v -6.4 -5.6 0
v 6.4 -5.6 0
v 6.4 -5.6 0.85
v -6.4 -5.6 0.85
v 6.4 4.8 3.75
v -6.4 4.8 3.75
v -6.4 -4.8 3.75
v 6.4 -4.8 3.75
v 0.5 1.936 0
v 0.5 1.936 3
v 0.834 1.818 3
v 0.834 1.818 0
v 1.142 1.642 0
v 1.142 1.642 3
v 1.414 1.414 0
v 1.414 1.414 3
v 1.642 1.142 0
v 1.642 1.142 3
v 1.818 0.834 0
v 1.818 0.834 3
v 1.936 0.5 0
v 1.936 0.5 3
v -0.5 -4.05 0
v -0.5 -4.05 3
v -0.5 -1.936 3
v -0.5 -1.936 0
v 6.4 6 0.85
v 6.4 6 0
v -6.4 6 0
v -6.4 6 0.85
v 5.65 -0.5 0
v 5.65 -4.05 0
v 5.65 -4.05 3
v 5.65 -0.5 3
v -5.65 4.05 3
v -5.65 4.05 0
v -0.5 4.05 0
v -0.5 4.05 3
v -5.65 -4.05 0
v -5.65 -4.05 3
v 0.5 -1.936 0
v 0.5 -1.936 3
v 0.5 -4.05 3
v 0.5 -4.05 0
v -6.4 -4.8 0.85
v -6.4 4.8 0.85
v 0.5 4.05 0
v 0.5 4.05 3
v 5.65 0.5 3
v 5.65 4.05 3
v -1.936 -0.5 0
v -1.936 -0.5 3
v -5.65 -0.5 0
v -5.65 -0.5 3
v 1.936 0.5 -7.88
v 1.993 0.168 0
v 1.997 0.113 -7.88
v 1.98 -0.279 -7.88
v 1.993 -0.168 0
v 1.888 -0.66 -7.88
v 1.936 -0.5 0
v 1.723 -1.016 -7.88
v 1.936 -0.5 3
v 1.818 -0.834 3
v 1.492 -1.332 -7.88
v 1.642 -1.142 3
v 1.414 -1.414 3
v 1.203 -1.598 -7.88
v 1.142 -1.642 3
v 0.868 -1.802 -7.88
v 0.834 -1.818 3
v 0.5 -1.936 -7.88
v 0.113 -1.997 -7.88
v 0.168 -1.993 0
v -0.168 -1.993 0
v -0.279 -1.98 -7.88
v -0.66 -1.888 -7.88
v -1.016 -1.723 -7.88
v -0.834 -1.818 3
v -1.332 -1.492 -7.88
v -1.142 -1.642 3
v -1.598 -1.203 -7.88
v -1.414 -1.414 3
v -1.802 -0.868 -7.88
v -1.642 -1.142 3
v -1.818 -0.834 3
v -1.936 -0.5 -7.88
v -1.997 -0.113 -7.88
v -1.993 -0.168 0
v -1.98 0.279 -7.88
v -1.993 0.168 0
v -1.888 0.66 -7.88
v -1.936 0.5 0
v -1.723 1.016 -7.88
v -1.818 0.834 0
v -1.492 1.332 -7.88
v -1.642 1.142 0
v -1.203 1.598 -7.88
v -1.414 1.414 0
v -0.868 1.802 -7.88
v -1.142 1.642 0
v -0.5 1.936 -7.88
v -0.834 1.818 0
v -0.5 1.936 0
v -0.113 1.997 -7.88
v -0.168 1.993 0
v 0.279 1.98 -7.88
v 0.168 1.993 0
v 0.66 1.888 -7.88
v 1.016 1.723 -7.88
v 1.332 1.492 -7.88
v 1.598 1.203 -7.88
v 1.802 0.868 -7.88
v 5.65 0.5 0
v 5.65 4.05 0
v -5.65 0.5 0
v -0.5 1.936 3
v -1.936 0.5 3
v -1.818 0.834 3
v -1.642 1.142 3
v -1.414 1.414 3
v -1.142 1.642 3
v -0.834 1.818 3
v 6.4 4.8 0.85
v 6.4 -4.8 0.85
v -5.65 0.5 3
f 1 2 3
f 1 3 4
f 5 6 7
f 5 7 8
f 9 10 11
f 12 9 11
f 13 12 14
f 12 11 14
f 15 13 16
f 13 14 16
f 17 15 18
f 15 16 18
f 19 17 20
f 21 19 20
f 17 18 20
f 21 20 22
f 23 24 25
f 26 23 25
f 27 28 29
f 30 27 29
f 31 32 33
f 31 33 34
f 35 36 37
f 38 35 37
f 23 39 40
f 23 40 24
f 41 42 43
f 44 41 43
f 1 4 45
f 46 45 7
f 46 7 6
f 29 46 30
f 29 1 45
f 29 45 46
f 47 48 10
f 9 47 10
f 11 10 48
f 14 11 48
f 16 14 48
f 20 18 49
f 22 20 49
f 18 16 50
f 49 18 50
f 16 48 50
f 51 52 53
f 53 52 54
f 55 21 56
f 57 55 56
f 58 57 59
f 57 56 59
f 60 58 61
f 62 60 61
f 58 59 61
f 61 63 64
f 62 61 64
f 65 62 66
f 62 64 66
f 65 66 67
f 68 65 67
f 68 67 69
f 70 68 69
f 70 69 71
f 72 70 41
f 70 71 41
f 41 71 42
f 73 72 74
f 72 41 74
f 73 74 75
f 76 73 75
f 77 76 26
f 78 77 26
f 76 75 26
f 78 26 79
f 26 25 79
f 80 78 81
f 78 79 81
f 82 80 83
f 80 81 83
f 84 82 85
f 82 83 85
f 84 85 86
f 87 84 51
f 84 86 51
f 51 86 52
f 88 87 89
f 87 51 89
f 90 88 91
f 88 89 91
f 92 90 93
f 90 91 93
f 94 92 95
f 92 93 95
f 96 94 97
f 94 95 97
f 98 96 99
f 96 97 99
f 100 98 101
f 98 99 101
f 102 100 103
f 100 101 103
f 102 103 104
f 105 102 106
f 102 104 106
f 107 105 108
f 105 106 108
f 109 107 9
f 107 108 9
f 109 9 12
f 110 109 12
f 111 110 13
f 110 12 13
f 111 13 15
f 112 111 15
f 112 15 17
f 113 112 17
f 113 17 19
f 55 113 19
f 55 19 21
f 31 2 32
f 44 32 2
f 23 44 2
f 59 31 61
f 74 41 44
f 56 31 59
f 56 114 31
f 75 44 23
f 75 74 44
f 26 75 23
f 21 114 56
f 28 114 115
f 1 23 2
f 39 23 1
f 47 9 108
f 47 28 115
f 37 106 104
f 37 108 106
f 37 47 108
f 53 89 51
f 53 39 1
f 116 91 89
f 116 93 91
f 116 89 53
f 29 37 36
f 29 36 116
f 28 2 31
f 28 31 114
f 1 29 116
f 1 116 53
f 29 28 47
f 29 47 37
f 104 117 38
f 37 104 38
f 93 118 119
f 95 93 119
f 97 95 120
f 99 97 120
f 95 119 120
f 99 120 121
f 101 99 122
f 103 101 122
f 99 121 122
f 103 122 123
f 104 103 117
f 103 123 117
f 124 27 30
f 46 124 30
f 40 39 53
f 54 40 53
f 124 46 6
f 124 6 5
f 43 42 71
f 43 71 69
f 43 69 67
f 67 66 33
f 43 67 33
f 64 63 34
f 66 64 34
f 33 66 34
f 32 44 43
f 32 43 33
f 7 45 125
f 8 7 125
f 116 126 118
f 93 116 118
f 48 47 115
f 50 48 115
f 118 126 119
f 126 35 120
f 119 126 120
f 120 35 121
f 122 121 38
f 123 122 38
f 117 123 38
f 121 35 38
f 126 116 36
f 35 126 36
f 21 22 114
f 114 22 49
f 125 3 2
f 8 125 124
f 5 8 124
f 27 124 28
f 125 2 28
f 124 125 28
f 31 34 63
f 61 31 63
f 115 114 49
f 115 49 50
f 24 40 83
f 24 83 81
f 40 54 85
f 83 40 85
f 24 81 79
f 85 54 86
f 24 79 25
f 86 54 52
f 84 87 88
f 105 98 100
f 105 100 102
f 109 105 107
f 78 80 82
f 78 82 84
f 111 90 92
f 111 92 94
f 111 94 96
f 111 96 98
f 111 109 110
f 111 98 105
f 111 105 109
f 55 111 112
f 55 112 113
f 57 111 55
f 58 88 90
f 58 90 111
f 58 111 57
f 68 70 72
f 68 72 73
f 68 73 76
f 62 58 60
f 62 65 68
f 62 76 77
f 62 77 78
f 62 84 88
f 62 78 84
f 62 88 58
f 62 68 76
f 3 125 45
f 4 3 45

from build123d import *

# Parameters (mm, degrees)
SCHIZZO1_W                   = 12.8
SCHIZZO1_H                   = 9.6
SCHIZZO1_W_2                 = 11.3
SCHIZZO1_H_2                 = 8.1
ESTRUSIONE_ESTRUSIONE1_DEPTH = 3
SCHIZZO2_W                   = 12.8
SCHIZZO2_H                   = 9.6
ESTRUSIONE_ESTRUSIONE2_DEPTH = 0.75
SCHIZZO3_W                   = 12.8
SCHIZZO3_H                   = 1.2
SCHIZZO3_H_2                 = 0.8
ESTRUSIONE_ESTRUSIONE3_DEPTH = 0.85
ESTRUSIONE_ESTRUSIONE4_DEPTH = 3
SCHIZZO5_R                   = 2
ESTRUSIONE_ESTRUSIONE5_DEPTH = 7.88


with BuildPart() as part:
    # Schizzo1 → Estrusione-Estrusione1 (new body)
    with BuildSketch(Plane.XY):
        Rectangle(SCHIZZO1_W, SCHIZZO1_H)
        Rectangle(SCHIZZO1_W_2, SCHIZZO1_H_2, mode=Mode.SUBTRACT)
    extrude(amount=ESTRUSIONE_ESTRUSIONE1_DEPTH)

    # Schizzo2 → Estrusione-Estrusione2 (add)
    with BuildSketch(Plane.XY.offset(3)):
        Rectangle(SCHIZZO2_W, SCHIZZO2_H)
    extrude(amount=ESTRUSIONE_ESTRUSIONE2_DEPTH)

    # Schizzo3 → Estrusione-Estrusione3 (add)
    with BuildSketch(Plane(origin=(0, 0, 0), x_dir=(-1, 0, 0), z_dir=(0, 0, -1))):
        with Locations((0, 5.4)):
            Rectangle(SCHIZZO3_W, SCHIZZO3_H)
        with Locations((0, -5.2)):
            Rectangle(SCHIZZO3_W, SCHIZZO3_H_2)
    extrude(amount=-ESTRUSIONE_ESTRUSIONE3_DEPTH)



with BuildPart() as body_2:
    # Schizzo4 → Estrusione-Estrusione4 (new, through all)
    with BuildSketch(Plane(origin=(0, 0, 3), x_dir=(-1, 0, 0), z_dir=(0, 0, -1))):
        with BuildLine():
            Line((5.65, -0.5), (5.65, 0.5))
            Line((5.65, 0.5), (1.936491673, 0.5))
            ThreePointArc((1.936491673, 0.5), (1.414213562, 1.414213562), (0.5, 1.936491673))
            Line((0.5, 1.936491673), (0.5, 4.05))
            Line((0.5, 4.05), (-0.5, 4.05))
            Line((-0.5, 4.05), (-0.5, 1.936491673))
            ThreePointArc((-0.5, 1.936491673), (-1.414213562, 1.414213562), (-1.936491673, 0.5))
            Line((-1.936491673, 0.5), (-5.65, 0.5))
            Line((-5.65, 0.5), (-5.65, -0.5))
            Line((-5.65, -0.5), (-1.936491673, -0.5))
            ThreePointArc((-1.936491673, -0.5), (-1.414213562, -1.414213562), (-0.5, -1.936491673))
            Line((-0.5, -1.936491673), (-0.5, -4.05))
            Line((-0.5, -4.05), (0.5, -4.05))
            Line((0.5, -4.05), (0.5, -1.936491673))
            ThreePointArc((0.5, -1.936491673), (1.414213562, -1.414213562), (1.936491673, -0.5))
            Line((1.936491673, -0.5), (5.65, -0.5))
        make_face()
    extrude(amount=ESTRUSIONE_ESTRUSIONE4_DEPTH)


with BuildPart() as part_1:
    add(part.part)

    add(body_2.part)  # Estrusione-Estrusione5 merges body 2
    # Schizzo5 → Estrusione-Estrusione5 (add)
    with BuildSketch(Plane(origin=(0, 0, 0), x_dir=(-1, 0, 0), z_dir=(0, 0, -1))):
        with Locations(Location((0, 0, 0), (0, 0, 165.522487814))):
            Circle(SCHIZZO5_R)
    extrude(amount=ESTRUSIONE_ESTRUSIONE5_DEPTH)


solid = part_1.part
